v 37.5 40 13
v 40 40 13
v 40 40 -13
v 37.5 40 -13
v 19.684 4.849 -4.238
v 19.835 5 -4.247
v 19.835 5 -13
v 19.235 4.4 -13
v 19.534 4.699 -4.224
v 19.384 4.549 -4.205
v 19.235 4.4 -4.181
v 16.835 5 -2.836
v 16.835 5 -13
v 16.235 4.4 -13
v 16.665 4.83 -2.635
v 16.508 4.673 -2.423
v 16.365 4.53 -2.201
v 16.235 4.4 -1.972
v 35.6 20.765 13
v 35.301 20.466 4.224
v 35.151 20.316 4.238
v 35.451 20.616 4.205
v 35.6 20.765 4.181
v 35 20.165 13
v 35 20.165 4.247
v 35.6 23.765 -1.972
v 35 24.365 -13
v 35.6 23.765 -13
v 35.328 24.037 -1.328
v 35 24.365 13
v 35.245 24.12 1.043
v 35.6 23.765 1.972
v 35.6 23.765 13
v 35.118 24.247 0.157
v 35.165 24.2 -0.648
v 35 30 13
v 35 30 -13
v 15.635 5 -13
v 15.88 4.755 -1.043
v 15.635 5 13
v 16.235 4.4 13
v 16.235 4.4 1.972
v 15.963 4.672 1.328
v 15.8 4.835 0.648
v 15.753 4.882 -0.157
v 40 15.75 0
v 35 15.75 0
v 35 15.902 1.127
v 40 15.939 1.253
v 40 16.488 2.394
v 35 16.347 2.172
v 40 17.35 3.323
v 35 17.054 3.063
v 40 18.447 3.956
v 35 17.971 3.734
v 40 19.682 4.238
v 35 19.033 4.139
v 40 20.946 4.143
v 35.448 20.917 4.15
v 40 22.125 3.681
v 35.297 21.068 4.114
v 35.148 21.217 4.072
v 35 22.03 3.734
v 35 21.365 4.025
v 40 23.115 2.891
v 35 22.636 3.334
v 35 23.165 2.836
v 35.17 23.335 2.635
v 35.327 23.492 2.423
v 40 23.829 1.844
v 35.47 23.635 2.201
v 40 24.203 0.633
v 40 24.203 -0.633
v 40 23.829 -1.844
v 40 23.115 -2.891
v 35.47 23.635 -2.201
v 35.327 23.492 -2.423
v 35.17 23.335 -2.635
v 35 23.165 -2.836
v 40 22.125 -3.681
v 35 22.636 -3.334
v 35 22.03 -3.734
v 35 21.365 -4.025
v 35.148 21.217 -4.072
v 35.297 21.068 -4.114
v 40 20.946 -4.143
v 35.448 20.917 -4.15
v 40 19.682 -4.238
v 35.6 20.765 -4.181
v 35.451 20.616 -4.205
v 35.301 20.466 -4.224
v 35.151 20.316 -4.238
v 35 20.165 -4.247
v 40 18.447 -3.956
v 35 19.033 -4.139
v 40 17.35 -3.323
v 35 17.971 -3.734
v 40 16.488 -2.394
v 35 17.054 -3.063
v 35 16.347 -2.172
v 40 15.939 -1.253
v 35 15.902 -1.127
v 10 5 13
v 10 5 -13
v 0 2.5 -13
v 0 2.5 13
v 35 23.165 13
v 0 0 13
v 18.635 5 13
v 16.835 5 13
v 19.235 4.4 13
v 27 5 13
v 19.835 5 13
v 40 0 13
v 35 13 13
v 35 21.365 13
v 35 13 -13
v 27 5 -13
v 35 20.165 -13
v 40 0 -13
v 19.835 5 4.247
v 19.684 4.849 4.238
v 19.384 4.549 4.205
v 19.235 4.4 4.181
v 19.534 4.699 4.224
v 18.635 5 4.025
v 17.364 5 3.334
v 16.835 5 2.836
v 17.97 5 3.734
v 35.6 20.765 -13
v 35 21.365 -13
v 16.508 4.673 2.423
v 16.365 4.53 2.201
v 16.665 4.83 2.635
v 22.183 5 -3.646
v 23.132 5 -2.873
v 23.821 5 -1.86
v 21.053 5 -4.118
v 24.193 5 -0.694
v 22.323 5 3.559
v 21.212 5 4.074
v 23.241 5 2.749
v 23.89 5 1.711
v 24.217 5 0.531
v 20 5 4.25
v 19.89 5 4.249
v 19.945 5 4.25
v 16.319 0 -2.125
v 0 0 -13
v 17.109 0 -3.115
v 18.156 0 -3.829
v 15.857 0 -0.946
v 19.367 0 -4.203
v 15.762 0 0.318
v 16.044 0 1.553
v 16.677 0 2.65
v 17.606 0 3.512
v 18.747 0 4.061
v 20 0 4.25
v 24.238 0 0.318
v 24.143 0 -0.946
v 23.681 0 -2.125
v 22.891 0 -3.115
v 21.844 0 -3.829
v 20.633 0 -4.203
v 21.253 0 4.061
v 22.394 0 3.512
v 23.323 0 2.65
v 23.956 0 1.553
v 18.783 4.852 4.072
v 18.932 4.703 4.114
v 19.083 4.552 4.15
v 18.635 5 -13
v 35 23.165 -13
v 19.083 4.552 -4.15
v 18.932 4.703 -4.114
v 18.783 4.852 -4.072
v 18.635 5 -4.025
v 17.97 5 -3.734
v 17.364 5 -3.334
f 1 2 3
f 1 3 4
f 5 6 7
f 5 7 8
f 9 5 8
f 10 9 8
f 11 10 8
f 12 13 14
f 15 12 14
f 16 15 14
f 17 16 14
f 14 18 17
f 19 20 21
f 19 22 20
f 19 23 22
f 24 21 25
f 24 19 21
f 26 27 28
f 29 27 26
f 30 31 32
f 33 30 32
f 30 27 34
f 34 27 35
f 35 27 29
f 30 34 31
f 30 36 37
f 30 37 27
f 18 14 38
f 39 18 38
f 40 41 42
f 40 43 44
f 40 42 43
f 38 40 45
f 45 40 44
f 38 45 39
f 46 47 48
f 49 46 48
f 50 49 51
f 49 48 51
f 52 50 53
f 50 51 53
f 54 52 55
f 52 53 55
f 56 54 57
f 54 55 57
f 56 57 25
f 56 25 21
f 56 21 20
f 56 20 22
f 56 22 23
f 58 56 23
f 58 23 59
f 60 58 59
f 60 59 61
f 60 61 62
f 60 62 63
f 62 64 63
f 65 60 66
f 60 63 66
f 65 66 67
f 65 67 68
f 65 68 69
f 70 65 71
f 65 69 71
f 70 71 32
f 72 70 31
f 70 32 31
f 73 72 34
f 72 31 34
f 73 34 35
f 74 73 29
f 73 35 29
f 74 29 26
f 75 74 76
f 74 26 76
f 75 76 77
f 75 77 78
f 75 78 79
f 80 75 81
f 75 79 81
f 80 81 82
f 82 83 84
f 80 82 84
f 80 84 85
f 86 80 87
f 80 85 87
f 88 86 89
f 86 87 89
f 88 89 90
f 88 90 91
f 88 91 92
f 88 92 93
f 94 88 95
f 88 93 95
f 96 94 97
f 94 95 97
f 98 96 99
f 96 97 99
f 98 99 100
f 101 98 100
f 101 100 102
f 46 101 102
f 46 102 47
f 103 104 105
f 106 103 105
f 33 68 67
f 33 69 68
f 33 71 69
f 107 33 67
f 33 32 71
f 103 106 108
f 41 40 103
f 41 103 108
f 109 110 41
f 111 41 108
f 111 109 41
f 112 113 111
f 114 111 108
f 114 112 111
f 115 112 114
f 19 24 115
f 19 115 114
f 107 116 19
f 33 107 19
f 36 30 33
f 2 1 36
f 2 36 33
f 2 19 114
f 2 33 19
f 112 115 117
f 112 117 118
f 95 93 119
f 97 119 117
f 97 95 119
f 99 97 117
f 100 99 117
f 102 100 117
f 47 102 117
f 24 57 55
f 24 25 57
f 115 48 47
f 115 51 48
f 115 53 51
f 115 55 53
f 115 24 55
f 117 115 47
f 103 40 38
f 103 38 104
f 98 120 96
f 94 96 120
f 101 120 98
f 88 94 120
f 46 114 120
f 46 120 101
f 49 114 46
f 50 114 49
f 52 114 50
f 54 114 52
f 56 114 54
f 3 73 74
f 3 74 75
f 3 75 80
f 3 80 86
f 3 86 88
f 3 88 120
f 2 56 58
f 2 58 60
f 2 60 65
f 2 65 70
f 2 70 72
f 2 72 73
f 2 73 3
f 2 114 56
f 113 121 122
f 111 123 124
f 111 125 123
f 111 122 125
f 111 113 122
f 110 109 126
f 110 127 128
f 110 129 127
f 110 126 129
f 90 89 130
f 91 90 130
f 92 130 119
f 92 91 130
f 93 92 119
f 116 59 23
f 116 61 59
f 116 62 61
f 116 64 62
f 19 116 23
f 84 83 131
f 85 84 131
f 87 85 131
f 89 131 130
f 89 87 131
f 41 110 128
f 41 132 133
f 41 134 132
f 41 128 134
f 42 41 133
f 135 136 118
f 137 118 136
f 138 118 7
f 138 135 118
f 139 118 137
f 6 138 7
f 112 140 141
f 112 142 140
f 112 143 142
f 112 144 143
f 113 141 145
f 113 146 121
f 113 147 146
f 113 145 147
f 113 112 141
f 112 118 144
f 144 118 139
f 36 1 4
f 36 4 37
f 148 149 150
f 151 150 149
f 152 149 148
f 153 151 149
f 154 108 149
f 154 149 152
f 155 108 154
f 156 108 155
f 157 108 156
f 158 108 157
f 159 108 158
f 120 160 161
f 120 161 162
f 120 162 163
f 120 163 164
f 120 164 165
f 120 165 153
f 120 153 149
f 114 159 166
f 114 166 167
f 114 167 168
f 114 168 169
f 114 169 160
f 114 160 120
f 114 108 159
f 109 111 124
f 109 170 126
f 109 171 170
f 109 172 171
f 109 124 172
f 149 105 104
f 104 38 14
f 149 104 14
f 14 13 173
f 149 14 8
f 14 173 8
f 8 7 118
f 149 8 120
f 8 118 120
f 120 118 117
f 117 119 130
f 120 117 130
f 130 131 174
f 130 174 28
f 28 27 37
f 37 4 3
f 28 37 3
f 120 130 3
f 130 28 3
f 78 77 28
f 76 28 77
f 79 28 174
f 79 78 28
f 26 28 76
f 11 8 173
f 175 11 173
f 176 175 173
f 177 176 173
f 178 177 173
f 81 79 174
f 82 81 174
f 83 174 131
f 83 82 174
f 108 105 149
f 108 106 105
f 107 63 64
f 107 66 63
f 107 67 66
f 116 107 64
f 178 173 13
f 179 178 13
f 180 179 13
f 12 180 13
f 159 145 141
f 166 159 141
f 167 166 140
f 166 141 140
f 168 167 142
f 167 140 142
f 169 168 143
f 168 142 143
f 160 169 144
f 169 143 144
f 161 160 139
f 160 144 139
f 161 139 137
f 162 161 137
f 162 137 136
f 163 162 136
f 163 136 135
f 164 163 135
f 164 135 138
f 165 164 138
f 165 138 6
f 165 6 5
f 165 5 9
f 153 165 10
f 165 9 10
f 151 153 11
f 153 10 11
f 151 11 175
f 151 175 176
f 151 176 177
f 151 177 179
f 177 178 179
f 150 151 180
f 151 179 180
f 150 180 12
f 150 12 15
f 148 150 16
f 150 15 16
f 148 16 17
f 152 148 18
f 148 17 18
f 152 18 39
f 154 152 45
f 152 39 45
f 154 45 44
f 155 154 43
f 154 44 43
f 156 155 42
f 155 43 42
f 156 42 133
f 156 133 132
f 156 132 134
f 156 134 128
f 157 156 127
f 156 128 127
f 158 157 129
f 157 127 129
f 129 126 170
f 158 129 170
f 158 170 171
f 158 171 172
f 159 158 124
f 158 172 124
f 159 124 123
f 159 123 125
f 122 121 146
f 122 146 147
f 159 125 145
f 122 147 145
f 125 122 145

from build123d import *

# Parameters (mm, degrees)
EXTRUDE_1_DEPTH     = 13
SKETCH_3_R          = 4.25
CUT_EXTRUDE_1_DEPTH = 55.717456081
SKETCH_4_R          = 4.25
CUT_EXTRUDE_2_DEPTH = 55.717456081


with BuildPart() as part:
    # 草图1 → 凸台-拉伸1 (new, symmetric)
    with BuildSketch(Plane.XY):
        Polygon((0, 0), (40, 0), (40, 40), (37.5, 40), (35, 30), (35, 24.364950833), (35.6, 23.764950833), (35, 23.164950833), (35, 21.364950833), (35.6, 20.764950833), (35, 20.164950833), (35, 13), (27, 5), (19.835049167, 5), (19.235049167, 4.4), (18.635049167, 5), (16.835049167, 5), (16.235049167, 4.4), (15.635049167, 5), (10, 5), (0, 2.5), align=None)
    extrude(amount=EXTRUDE_1_DEPTH, both=True)

    # 草图3 → 切除-拉伸1 (cut, through all)
    with BuildSketch(Plane(origin=(0, 5, 0), x_dir=(1, 0, 0), z_dir=(0, 1, 0))):
        with Locations(Location((20, 0, 0), (0, 0, 270))):
            Circle(SKETCH_3_R)
    extrude(amount=-CUT_EXTRUDE_1_DEPTH, mode=Mode.SUBTRACT)

    # 草图4 → 切除-拉伸2 (cut, through all)
    with BuildSketch(Plane.ZY.offset(-35)):
        with Locations(Location((0, 20, 0), (0, 0, 270))):
            Circle(SKETCH_4_R)
    extrude(amount=-CUT_EXTRUDE_2_DEPTH, mode=Mode.SUBTRACT)


solid = part.part
